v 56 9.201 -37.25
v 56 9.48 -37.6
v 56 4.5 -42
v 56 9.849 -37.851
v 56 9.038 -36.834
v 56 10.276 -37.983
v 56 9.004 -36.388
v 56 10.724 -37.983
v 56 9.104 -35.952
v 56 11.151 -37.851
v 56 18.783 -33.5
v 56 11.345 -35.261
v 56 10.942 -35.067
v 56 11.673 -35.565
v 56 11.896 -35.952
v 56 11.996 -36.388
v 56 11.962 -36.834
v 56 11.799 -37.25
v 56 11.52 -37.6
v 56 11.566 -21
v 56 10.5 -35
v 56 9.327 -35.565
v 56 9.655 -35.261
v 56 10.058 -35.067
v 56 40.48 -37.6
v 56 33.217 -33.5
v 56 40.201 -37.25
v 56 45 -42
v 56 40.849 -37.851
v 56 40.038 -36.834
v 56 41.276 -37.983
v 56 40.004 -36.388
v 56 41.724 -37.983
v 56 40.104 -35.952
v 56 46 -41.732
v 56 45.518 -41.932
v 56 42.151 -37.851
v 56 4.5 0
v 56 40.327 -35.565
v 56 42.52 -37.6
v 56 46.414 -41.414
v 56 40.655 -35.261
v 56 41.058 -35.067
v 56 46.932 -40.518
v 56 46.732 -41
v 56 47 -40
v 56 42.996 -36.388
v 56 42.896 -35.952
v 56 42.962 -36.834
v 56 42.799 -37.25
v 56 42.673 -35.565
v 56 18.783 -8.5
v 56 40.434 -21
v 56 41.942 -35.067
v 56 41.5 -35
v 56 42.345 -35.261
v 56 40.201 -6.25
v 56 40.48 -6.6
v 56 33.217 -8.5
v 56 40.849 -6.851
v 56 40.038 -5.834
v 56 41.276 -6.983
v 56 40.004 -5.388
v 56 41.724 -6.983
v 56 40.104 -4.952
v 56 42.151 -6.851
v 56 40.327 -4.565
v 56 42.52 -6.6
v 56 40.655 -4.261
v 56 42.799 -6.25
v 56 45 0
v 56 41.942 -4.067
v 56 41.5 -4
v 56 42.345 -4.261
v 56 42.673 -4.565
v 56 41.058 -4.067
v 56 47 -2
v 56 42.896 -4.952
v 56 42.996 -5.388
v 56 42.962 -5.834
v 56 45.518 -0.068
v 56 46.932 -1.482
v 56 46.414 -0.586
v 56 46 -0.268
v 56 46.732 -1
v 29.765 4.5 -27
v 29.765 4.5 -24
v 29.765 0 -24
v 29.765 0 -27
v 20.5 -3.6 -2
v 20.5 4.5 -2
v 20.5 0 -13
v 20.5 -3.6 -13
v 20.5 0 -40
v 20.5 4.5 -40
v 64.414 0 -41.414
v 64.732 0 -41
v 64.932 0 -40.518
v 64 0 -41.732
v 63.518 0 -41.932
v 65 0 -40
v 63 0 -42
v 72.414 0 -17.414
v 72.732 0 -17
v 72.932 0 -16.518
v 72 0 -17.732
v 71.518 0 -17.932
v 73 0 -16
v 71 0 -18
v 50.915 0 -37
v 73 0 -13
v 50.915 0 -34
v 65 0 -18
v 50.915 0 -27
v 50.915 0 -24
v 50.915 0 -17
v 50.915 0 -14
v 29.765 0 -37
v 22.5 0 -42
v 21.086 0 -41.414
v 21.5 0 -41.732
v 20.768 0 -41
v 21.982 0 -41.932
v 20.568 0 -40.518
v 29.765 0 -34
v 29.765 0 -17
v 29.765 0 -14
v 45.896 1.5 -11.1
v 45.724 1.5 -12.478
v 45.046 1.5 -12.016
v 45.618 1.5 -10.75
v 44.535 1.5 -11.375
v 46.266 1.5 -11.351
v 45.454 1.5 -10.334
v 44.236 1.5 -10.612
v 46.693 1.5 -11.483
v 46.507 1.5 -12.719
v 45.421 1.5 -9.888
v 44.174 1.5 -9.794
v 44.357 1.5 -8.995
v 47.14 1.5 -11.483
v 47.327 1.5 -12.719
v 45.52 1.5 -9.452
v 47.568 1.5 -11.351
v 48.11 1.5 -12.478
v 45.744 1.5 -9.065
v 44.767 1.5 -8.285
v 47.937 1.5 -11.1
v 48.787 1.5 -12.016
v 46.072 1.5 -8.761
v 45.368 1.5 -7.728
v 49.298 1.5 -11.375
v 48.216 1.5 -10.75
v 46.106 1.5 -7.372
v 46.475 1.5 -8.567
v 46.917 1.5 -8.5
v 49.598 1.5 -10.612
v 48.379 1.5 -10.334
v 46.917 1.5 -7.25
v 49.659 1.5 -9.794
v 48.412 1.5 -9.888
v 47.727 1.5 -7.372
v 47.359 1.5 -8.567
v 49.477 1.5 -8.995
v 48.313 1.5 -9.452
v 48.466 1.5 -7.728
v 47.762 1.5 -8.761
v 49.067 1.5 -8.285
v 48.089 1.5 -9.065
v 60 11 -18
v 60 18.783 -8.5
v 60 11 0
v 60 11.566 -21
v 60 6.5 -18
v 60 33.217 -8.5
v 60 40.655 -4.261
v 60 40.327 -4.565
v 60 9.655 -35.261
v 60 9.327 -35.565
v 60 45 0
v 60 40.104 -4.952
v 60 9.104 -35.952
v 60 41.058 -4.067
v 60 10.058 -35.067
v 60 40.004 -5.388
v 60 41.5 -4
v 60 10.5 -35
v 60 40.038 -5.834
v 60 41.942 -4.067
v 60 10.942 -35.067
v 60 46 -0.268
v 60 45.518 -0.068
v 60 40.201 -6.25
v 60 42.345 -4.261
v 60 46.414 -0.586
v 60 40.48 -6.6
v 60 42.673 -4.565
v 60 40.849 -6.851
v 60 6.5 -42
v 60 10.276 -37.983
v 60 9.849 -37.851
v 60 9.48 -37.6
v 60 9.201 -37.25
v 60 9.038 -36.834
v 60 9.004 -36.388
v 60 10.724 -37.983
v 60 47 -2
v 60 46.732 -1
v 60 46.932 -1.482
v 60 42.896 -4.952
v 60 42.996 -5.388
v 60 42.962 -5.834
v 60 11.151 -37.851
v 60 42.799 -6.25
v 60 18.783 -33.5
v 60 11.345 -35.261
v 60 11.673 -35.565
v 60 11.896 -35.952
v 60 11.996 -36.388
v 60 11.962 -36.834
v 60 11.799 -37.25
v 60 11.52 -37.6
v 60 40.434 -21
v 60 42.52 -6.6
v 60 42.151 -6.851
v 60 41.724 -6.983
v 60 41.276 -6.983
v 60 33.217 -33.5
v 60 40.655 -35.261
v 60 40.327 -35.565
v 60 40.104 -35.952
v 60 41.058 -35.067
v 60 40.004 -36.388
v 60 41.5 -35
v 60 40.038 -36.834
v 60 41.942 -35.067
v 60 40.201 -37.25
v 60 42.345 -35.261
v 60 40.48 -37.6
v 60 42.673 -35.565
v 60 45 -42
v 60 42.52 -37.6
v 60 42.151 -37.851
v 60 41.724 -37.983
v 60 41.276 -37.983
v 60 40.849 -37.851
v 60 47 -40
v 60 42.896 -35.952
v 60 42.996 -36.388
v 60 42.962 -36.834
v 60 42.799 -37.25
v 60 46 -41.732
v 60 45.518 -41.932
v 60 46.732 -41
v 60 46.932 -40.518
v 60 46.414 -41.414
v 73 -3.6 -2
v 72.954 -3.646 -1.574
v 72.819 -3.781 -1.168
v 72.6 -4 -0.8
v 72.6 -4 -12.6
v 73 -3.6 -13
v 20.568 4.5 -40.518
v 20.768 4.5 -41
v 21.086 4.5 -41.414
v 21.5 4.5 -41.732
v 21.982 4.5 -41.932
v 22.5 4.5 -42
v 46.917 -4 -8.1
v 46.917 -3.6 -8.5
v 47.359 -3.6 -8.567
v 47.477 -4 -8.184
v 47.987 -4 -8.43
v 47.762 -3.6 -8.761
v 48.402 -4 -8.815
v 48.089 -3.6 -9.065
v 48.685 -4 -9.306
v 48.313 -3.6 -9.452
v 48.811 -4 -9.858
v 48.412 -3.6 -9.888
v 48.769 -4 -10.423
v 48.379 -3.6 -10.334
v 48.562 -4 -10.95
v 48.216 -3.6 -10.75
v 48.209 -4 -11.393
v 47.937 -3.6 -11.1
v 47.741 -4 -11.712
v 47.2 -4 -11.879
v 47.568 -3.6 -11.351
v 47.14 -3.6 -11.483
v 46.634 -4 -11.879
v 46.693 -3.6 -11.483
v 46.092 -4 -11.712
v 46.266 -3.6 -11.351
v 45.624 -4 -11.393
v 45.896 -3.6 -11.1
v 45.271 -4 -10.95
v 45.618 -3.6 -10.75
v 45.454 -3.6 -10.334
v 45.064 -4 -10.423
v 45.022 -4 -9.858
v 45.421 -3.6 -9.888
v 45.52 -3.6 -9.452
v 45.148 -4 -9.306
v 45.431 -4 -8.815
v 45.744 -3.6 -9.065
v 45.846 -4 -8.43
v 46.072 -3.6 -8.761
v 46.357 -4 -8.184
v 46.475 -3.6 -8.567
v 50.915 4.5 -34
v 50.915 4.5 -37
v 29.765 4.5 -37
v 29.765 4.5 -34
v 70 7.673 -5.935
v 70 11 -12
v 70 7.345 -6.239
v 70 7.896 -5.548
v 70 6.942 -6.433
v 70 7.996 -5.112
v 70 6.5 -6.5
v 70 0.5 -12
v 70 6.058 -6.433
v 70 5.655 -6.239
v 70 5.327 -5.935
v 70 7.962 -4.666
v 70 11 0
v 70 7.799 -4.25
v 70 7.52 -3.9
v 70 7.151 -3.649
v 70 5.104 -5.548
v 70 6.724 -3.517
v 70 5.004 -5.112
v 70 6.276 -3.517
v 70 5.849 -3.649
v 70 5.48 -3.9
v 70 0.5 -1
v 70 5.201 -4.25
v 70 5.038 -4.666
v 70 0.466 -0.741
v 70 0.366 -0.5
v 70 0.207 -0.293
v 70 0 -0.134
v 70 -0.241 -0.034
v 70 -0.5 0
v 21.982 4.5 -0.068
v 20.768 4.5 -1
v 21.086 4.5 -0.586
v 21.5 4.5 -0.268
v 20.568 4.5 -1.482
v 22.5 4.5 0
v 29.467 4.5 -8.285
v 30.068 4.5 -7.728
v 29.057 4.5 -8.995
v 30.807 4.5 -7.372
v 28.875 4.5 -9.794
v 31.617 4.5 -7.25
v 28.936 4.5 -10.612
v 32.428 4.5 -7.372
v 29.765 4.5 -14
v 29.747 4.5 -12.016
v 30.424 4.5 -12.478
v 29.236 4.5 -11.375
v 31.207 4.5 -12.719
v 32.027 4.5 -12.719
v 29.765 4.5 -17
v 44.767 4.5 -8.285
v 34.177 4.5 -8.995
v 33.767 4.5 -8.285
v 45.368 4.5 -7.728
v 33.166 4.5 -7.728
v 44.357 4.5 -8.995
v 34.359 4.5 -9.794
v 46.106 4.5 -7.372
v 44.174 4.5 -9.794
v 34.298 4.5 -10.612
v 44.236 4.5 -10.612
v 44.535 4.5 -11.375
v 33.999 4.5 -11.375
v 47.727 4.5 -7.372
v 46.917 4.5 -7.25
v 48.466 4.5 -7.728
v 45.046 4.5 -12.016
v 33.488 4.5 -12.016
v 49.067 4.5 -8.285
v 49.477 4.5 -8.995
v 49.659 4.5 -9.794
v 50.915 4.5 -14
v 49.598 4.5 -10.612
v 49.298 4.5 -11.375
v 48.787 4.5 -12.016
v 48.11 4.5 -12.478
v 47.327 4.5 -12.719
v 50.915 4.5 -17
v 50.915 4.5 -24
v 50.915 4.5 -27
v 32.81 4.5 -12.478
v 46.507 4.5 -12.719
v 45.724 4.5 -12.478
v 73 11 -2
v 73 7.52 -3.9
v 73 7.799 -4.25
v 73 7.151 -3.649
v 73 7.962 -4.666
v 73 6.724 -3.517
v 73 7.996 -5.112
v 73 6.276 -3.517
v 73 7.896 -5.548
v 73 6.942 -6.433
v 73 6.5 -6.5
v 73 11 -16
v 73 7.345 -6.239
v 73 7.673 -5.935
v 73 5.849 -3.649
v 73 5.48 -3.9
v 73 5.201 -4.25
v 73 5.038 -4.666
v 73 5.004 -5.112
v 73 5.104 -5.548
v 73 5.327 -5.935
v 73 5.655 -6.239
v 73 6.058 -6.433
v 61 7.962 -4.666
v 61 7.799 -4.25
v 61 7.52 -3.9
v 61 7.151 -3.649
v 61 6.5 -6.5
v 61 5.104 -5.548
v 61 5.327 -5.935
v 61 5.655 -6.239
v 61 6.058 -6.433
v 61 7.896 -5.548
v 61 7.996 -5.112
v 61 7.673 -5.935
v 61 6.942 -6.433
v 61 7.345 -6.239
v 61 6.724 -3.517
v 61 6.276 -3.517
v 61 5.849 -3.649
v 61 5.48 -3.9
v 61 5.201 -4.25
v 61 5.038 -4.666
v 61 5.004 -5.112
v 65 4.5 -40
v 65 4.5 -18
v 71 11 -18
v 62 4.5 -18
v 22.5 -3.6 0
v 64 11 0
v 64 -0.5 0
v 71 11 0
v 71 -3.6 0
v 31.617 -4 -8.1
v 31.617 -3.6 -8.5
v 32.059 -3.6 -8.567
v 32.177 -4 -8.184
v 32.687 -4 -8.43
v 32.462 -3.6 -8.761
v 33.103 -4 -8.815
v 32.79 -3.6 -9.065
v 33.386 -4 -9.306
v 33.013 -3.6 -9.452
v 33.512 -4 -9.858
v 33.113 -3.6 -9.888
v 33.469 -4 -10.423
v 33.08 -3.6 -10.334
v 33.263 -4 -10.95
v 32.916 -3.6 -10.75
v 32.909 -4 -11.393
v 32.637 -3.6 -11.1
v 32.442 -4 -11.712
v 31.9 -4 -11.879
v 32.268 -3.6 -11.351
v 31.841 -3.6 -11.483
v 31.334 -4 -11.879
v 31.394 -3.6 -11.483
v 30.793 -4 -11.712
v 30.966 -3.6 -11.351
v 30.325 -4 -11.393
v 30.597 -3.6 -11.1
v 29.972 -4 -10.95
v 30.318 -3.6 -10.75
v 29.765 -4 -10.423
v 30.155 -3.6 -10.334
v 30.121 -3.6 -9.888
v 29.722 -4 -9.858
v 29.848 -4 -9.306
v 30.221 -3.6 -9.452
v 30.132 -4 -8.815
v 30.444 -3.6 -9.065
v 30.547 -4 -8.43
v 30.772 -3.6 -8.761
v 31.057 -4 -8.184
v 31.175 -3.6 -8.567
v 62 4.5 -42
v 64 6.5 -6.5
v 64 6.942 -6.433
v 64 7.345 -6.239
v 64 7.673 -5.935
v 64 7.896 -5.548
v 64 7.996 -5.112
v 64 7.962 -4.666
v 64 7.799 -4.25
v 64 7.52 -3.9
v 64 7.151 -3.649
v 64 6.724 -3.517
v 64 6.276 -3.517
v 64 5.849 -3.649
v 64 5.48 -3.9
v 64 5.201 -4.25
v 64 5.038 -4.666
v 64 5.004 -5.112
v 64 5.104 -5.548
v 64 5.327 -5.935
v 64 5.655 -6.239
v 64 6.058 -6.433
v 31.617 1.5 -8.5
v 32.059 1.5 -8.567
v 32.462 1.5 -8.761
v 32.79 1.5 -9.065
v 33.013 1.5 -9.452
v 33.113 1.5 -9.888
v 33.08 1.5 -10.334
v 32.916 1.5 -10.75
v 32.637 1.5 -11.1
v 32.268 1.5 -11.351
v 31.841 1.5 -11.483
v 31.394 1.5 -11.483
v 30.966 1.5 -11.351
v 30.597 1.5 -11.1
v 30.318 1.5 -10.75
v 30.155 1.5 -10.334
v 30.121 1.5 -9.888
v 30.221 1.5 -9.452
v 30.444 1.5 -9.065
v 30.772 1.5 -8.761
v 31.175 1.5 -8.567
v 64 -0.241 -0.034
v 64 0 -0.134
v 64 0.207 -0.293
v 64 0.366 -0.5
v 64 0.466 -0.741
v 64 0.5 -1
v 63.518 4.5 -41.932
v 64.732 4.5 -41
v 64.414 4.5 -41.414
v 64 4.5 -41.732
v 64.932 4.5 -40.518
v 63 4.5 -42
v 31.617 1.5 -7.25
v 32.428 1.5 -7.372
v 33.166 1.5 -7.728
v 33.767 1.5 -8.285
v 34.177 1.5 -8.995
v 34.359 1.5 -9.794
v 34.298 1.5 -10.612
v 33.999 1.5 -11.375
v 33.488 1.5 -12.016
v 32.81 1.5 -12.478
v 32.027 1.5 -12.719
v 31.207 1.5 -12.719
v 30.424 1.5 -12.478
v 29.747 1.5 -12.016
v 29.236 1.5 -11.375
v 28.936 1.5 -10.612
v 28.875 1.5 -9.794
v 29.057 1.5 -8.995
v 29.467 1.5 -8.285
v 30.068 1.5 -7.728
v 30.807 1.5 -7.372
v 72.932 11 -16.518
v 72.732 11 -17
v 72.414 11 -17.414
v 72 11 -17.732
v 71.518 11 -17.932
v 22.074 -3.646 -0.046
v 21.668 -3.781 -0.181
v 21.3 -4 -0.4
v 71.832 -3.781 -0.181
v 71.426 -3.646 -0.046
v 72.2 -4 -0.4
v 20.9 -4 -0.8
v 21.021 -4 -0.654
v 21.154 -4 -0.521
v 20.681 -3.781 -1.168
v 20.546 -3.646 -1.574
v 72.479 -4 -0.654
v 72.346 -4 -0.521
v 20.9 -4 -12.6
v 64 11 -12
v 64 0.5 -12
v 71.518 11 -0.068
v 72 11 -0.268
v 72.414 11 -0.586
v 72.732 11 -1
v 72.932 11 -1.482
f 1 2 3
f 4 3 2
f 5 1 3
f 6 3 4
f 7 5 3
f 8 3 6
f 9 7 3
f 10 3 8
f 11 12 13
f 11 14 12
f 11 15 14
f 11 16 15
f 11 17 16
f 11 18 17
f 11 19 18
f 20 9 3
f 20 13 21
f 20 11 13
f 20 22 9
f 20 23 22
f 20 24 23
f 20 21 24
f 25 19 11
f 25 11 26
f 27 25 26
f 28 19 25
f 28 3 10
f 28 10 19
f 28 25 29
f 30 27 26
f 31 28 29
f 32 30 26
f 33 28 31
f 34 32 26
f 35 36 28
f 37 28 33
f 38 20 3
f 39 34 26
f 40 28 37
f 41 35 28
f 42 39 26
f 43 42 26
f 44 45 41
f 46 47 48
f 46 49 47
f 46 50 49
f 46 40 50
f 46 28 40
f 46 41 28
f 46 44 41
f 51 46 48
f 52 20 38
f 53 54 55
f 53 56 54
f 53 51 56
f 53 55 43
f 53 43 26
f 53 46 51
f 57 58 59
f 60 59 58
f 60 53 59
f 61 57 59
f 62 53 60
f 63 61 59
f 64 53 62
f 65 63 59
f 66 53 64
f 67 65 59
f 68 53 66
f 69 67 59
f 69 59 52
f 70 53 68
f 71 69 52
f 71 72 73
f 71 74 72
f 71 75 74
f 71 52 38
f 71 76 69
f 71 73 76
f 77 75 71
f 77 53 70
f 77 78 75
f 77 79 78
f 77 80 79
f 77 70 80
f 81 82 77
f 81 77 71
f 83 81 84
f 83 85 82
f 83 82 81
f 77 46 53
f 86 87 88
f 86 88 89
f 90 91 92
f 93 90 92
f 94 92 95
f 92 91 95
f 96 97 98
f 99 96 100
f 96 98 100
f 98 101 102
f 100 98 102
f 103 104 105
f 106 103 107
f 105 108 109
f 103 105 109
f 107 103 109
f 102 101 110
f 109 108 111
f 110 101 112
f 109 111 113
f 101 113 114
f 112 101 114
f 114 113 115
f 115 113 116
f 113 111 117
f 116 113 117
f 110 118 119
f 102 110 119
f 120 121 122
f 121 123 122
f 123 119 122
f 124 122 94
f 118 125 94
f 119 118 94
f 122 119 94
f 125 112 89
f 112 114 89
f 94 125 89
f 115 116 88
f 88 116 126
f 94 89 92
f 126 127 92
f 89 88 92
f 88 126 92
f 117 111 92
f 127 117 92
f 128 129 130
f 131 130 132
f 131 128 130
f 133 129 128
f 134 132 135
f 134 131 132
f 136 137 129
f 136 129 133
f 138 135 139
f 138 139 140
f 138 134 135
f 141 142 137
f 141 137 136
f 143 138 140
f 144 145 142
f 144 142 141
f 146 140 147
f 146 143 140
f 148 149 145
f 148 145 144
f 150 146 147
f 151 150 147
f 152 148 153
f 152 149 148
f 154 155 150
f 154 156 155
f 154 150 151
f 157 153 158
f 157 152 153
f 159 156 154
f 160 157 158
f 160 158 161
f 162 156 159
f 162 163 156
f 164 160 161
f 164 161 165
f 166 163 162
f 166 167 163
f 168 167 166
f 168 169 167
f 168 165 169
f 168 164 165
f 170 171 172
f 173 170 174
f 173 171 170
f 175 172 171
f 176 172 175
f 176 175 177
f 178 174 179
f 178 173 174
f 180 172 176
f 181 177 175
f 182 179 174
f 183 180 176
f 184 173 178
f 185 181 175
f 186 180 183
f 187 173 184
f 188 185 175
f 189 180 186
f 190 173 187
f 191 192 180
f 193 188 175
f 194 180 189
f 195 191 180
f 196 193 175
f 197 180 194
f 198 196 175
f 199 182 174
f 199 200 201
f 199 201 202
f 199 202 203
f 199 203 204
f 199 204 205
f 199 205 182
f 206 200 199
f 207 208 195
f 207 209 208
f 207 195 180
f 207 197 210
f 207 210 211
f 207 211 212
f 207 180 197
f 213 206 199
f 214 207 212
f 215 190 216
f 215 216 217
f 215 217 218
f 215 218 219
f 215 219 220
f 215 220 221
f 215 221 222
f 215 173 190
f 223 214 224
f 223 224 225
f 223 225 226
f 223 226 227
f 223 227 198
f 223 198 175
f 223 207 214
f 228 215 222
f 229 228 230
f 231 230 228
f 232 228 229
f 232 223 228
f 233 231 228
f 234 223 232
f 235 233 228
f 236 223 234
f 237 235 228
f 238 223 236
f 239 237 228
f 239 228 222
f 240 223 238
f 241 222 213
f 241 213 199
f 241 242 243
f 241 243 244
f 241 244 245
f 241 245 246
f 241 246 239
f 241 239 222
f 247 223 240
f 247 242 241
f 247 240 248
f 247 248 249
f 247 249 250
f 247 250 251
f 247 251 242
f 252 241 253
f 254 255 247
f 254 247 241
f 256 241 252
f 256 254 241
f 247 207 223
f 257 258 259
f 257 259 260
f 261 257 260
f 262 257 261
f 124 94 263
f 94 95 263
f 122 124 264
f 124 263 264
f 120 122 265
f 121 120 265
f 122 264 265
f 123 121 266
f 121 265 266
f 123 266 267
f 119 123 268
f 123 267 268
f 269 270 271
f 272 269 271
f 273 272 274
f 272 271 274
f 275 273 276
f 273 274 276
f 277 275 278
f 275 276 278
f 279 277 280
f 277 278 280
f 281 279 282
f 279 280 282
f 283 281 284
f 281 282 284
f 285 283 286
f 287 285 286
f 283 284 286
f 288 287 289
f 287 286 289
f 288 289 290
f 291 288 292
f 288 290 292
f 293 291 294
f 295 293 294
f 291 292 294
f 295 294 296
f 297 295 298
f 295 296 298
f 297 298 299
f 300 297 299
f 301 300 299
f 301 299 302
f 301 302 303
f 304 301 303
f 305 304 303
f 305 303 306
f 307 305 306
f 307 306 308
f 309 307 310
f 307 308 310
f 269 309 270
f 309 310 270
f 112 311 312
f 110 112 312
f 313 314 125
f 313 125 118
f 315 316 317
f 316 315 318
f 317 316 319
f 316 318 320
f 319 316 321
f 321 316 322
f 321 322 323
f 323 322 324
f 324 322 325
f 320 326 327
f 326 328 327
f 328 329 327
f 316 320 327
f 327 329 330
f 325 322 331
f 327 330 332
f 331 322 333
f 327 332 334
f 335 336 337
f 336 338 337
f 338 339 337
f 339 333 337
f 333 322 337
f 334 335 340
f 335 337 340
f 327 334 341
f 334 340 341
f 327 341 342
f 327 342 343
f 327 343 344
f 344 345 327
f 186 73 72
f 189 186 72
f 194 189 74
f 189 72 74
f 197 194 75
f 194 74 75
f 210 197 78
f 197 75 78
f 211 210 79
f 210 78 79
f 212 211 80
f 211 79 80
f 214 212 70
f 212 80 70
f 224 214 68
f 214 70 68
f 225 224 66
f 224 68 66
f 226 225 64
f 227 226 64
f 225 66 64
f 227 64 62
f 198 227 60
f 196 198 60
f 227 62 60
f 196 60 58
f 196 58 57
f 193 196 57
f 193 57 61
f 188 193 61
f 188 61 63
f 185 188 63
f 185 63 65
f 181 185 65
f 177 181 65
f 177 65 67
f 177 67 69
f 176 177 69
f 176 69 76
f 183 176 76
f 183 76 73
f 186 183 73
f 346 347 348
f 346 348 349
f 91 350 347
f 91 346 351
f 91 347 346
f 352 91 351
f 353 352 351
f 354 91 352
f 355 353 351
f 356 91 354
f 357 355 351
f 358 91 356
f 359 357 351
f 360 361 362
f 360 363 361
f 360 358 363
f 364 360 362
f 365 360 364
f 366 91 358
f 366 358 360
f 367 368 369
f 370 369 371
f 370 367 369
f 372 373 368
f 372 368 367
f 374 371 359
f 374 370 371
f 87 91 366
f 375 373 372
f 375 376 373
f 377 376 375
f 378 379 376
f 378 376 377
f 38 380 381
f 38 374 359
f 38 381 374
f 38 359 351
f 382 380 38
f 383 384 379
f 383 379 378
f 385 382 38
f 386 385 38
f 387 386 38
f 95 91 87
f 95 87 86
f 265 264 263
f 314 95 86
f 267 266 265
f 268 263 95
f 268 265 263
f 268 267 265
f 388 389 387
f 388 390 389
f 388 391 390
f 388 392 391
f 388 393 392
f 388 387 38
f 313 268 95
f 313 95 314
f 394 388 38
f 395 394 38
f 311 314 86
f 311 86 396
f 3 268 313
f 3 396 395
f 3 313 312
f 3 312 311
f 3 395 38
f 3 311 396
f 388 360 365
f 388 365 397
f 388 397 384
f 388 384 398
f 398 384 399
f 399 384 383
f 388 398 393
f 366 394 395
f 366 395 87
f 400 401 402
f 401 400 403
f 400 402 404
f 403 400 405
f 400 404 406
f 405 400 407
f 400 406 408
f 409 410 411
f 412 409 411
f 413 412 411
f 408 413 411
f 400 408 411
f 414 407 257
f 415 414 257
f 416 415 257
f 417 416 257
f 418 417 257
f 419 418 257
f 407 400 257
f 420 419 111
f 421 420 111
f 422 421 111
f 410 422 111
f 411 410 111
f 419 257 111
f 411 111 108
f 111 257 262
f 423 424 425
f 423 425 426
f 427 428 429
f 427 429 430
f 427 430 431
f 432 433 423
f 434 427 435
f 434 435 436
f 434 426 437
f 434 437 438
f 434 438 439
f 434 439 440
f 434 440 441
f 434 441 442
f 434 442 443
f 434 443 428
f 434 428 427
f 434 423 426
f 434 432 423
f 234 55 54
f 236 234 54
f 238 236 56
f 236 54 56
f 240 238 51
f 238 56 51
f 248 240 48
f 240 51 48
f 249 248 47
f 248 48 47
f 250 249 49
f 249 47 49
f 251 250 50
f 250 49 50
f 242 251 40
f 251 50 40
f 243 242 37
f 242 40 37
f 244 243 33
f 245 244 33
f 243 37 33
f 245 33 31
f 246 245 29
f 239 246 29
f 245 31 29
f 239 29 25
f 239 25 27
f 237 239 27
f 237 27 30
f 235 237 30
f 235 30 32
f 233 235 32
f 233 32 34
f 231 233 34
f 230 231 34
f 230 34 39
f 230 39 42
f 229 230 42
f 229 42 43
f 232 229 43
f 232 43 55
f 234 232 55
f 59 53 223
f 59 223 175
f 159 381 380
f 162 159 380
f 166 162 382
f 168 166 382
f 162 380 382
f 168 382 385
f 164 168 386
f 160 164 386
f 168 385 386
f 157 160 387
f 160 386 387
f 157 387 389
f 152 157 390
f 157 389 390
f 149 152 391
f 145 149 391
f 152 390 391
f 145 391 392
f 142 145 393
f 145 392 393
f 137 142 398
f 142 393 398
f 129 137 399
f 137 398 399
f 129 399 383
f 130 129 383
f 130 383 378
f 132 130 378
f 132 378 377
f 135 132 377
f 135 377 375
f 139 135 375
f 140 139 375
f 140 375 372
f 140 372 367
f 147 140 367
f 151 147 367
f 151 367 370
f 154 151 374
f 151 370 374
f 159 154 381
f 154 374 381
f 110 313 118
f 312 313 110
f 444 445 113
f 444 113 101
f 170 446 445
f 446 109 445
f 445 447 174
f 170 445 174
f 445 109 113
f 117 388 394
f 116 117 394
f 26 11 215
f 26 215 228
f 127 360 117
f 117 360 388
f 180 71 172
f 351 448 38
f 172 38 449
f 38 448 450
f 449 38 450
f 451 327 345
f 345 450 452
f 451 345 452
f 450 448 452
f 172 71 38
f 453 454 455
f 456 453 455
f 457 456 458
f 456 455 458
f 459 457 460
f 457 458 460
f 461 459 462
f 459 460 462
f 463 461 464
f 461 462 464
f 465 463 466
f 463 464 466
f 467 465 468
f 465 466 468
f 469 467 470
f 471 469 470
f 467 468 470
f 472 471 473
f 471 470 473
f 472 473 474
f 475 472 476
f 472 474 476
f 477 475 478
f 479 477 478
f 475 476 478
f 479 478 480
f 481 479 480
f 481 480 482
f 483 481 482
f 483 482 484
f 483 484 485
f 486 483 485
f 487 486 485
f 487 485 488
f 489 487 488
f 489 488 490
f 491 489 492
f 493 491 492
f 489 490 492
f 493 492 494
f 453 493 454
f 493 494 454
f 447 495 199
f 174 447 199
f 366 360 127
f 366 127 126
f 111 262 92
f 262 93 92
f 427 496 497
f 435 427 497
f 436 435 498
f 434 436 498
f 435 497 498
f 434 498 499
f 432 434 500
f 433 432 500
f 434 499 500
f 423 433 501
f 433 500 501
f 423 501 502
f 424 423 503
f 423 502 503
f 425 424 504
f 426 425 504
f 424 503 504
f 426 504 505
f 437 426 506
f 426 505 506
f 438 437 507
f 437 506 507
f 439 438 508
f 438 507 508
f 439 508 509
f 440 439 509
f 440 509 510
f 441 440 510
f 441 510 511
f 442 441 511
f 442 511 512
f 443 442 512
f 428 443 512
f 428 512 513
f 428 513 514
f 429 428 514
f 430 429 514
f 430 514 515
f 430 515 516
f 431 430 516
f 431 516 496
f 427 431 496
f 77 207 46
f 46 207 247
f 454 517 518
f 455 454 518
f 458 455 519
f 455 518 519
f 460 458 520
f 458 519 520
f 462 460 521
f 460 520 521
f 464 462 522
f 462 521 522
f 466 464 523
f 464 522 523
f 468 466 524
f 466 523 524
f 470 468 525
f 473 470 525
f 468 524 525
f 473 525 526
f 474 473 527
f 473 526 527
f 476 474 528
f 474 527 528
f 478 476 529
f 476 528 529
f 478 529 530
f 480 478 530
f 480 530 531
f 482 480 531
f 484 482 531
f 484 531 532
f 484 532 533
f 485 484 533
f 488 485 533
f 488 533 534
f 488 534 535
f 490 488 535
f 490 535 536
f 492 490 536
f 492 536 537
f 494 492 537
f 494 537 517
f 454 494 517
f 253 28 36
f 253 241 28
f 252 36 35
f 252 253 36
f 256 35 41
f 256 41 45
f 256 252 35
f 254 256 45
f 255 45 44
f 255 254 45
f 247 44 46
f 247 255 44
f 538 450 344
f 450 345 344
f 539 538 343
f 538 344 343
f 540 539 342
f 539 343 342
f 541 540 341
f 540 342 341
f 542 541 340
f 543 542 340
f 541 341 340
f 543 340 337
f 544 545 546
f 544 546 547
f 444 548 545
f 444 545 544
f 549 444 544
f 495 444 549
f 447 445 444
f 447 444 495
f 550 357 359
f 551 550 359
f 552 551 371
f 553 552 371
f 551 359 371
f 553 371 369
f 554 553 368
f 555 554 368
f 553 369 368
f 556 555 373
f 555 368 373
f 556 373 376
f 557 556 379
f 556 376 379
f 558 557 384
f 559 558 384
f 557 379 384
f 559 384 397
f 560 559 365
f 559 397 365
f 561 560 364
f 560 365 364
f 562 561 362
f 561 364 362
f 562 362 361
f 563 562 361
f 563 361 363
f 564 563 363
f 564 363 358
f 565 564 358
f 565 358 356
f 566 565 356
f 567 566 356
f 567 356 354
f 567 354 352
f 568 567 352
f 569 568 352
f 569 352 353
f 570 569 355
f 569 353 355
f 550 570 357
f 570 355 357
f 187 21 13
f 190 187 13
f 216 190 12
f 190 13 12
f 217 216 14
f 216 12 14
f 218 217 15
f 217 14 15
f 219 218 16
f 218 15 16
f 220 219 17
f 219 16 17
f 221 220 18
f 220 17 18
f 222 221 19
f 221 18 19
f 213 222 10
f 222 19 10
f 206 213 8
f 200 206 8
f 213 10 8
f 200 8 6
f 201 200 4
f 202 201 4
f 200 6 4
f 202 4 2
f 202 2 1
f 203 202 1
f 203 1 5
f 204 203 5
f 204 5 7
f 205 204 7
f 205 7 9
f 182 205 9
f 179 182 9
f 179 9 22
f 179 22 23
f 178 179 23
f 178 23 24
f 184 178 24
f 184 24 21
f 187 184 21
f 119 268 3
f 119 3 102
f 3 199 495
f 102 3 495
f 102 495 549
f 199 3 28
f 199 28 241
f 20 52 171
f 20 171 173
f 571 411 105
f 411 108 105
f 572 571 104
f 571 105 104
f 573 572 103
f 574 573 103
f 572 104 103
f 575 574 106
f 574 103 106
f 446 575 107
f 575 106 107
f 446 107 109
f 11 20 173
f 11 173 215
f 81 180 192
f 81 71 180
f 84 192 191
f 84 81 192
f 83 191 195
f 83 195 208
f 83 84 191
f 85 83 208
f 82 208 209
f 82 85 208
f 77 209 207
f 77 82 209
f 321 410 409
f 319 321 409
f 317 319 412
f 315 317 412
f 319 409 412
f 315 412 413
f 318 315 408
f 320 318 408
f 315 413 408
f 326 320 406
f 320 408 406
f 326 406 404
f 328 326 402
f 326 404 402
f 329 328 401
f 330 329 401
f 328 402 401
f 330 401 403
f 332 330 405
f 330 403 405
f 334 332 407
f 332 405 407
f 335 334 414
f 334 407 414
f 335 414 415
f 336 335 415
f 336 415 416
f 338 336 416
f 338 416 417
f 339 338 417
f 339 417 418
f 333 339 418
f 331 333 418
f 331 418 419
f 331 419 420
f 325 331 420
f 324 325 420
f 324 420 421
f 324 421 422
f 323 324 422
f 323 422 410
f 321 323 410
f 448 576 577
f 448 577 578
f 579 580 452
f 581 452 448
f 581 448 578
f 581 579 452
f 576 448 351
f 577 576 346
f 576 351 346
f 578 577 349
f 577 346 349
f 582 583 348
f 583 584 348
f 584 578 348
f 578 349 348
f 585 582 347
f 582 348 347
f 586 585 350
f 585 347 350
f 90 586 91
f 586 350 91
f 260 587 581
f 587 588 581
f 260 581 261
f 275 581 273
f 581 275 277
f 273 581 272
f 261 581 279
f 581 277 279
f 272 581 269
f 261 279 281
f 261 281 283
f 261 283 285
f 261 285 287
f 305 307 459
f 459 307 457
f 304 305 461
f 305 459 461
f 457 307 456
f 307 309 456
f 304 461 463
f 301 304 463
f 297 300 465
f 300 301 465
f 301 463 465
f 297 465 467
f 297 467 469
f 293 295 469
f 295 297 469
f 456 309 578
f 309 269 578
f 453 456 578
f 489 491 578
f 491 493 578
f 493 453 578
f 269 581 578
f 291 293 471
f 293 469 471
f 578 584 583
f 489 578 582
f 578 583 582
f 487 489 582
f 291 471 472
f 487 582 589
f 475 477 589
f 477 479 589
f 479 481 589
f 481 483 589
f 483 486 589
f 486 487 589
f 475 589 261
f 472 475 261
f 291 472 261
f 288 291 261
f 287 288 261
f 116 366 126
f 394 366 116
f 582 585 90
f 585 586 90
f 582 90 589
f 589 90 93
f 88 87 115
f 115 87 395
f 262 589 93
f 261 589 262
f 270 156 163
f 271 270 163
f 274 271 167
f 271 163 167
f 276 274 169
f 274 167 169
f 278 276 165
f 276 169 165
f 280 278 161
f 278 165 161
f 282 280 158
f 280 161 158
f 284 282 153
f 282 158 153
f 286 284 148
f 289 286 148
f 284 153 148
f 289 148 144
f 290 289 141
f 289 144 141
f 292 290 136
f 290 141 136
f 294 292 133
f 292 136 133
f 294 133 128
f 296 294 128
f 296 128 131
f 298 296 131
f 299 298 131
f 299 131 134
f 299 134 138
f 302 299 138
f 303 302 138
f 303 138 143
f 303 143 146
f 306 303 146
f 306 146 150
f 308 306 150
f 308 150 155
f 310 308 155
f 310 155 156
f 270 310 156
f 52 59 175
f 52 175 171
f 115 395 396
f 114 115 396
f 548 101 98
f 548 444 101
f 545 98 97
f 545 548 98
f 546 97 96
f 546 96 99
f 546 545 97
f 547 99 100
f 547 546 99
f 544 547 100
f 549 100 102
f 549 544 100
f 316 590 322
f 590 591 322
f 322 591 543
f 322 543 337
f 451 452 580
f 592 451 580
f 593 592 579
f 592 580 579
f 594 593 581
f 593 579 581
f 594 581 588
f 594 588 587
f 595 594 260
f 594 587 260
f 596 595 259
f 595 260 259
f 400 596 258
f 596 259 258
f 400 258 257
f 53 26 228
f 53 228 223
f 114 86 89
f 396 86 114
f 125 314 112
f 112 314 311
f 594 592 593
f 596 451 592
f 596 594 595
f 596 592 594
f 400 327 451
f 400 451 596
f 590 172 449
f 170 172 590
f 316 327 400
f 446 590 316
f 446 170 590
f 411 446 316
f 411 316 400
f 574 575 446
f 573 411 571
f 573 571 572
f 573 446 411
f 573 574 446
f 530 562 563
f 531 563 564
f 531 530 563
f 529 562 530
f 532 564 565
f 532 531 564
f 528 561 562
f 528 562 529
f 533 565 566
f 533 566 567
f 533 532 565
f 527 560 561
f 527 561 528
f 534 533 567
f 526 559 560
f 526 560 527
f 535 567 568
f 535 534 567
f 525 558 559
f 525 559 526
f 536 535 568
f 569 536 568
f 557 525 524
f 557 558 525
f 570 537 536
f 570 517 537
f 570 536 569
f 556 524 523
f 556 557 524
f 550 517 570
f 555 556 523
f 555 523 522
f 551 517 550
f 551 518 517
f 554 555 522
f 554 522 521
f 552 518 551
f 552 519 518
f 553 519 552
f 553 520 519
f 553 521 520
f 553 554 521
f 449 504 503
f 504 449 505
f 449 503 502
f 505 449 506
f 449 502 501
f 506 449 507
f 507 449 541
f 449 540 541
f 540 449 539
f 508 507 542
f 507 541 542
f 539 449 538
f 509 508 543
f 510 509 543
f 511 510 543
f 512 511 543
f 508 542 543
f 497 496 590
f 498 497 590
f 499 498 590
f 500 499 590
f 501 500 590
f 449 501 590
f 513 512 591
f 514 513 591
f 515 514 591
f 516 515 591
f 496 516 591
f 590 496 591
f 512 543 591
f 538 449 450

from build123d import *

# Parameters (mm, degrees)
EXTRUDE_1_DEPTH           = 5
SKETCH_3_W                = 4
SKETCH_3_H                = 42
EXTRUDE_2_DEPTH           = 42
SKETCH_4_R                = 1.5
CUT_EXTRUDE_1_DEPTH       = 42.5
SKETCH_5_R                = 12.5
CUT_EXTRUDE_2_DEPTH       = 42.5
SKETCH_7_W                = 20
SKETCH_7_H                = 5
EXTRUDE_3_DEPTH           = 5
EXTRUDE_5_DEPTH           = 42
SKETCH_11_W               = 20
SKETCH_11_H               = 5
EXTRUDE_6_DEPTH           = 18
SKETCH_12_W               = 4
SKETCH_12_H               = 20
EXTRUDE_7_DEPTH           = 42
CUT_EXTRUDE_4_REACH       = 106.221
SKETCH_13_R               = 1.6
CUT_EXTRUDE_START         = -22
SKETCH_15_W               = 10
SKETCH_15_H               = 27
CUT_EXTRUDE_5_DEPTH       = 22
SKETCH_16_W               = 5
SKETCH_16_H               = 5
CUT_EXTRUDE_6_DEPTH       = 42
EXTRUDE_START             = -22
SKETCH_17_W               = 10
SKETCH_17_H               = 5
EXTRUDE_8_DEPTH           = 22
CUT_EXTRUDE_7_DEPTH       = 5
CHAMFER_1_SIZE            = 7
EXTRUDE_10_REACH          = 103.064
SKETCH_28_W               = 5
SKETCH_28_H               = 10
SKETCH_29_W               = 10
SKETCH_29_H               = 13
SKETCH_29_W_2             = 33
EXTRUDE_11_DEPTH          = 3
EXTRUDE_12_DEPTH          = 10
EXTRUDE_13_DEPTH          = 10
CUT_EXTRUDE_8_DEPTH       = 10
EXTRUDE_14_REACH          = 91.118
SKETCH_34_R               = 3
CUT_EXTRUDE_9_DEPTH       = 3
SKETCH_35_R               = 1.5
CUT_EXTRUDE_10_DEPTH      = 104.334408597
SKETCH_37_W               = 25
SKETCH_37_H               = 3.734653936
CUT_EXTRUDE_11_DEPTH      = 103.063705596
EXTRUDE_15_DEPTH          = 5
CUT_EXTRUDE_12_DEPTH      = 5
SKETCH_40_W               = 19
SKETCH_40_H               = 5
CUT_EXTRUDE_13_DEPTH      = 42
SKETCH_41_W               = 19
SKETCH_41_H               = 5
CUT_EXTRUDE_14_DEPTH      = 42
EXTRUDE_16_DEPTH          = 5
EXTRUDE_17_DEPTH          = 5
SKETCH_44_R               = 1.6
CUT_EXTRUDE_15_DEPTH      = 97.446876569
CUT_EXTRUDE_16_DEPTH      = 20
EXTRUDE_18_REACH          = 88.155
SKETCH_46_W               = 25
SKETCH_46_H               = 5
SKETCH_48_W               = 46
SKETCH_48_H               = 42
CUT_EXTRUDE_17_DEPTH      = 0.5
SKETCH_49_W               = 42
SKETCH_49_H               = 4.5
CUT_EXTRUDE_18_DEPTH      = 10.5
SKETCH_50_W               = 42
SKETCH_50_H               = 4.5
EXTRUDE_19_DEPTH          = 49.5
SKETCH_52_W               = 21.14986069
SKETCH_52_H               = 3
CUT_EXTRUDE_19_DEPTH      = 93.033961123
SKETCH_53_W               = 49.5
SKETCH_53_H               = 13
EXTRUDE_21_DEPTH          = 4
CUT_EXTRUDE_20_DEPTH      = 5
SKETCH_55_R               = 2.75
CUT_EXTRUDE_21_DEPTH      = 3
SKETCH_56_R               = 1.5
CUT_EXTRUDE_22_DEPTH      = 90.77332566
SKETCH_57_W               = 13
SKETCH_57_H               = 8.5
EXTRUDE_22_DEPTH          = 5
SKETCH_61_W               = 13
SKETCH_61_H               = 8.5
EXTRUDE_25_DEPTH          = 3
SKETCH_64_W               = 8
SKETCH_64_H               = 4.5
EXTRUDE_26_DEPTH          = 5
EXTRUDE_27_DEPTH          = 5
CUT_EXTRUDE_23_DEPTH      = 95.335836245
CUT_EXTRUDE_23_DEPTH_BACK = 4
SKETCH_62_W               = 6
SKETCH_62_H               = 12
FILLET_2_R                = 1
SKETCH_63_R               = 1.5
CUT_EXTRUDE_24_DEPTH      = 12
SKETCH_66_R               = 1.5
EXTRUDE_28_DEPTH          = 4
CHAMFER_2_SIZE            = 0.4
FILLET_3_R                = 2
EXTRUDE_29_DEPTH          = 24
FILLET_4_R                = 2
CUT_EXTRUDE_START_2       = -4.000001
CUT_EXTRUDE_25_DEPTH      = 4.000002
EXTRUDE_30_DEPTH          = 1.5


# Some blends are built 0.0001 mm under size
with BuildPart() as part:
    # 草图1 → 凸台-拉伸1 (new body)
    with BuildSketch(Plane(origin=(0, 0, 0), x_dir=(1, 0, 0), z_dir=(0, 1, 0))):
        Polygon((10, 0), (50, 0), (50, -20), (60, -20), (60, 0), (60, 42), (0, 42), (0, 0), (0, -20), (10, -20), align=None)
    extrude(amount=EXTRUDE_1_DEPTH)

    # 草图3 → 凸台-拉伸2 (add)
    with BuildSketch(Plane(origin=(0, 5, 0), x_dir=(1, 0, 0), z_dir=(0, 1, 0))):
        with Locations((58, 21)):
            Rectangle(SKETCH_3_W, SKETCH_3_H)
    extrude(amount=EXTRUDE_2_DEPTH)

    # 草图4 → 切除-拉伸1 (cut)
    with BuildSketch(Plane.ZY.offset(-56)):
        with Locations((-36.5, 41.5)):
            Circle(SKETCH_4_R)
        with Locations((-5.5, 41.5)):
            Circle(SKETCH_4_R)
        with Locations((-5.5, 10.5)):
            Circle(SKETCH_4_R)
        with Locations((-36.5, 10.5)):
            Circle(SKETCH_4_R)
    extrude(amount=-CUT_EXTRUDE_1_DEPTH, mode=Mode.SUBTRACT)

    # 草图5 → 切除-拉伸2 (cut)
    with BuildSketch(Plane.ZY.offset(-56)):
        with Locations((-21, 26)):
            Circle(SKETCH_5_R)
    extrude(amount=-CUT_EXTRUDE_2_DEPTH, mode=Mode.SUBTRACT)

    # 草图7 → 凸台-拉伸3 (add)
    with BuildSketch(Plane(origin=(60, 0, 0), x_dir=(0, 0, -1), z_dir=(1, 0, 0))):
        with Locations((-10, 2.5)):
            Rectangle(SKETCH_7_W, SKETCH_7_H)
    extrude(amount=EXTRUDE_3_DEPTH)

    # 草图8 → 凸台-拉伸5 (add)
    with BuildSketch(Plane(origin=(0, 5, 0), x_dir=(1, 0, 0), z_dir=(0, 1, 0))):
        Polygon((65, 0), (56, 0), (56, -5), (61, -5), (61, -15), (56, -15), (56, -20), (65, -20), align=None)
    extrude(amount=EXTRUDE_5_DEPTH)

    # 草图11 → 凸台-拉伸6 (add)
    with BuildSketch(Plane(origin=(65, 0, 0), x_dir=(0, 0, -1), z_dir=(1, 0, 0))):
        with Locations((-10, 2.5)):
            Rectangle(SKETCH_11_W, SKETCH_11_H)
    extrude(amount=EXTRUDE_6_DEPTH)

    # 草图12 → 凸台-拉伸7 (add)
    with BuildSketch(Plane(origin=(0, 5, 0), x_dir=(1, 0, 0), z_dir=(0, 1, 0))):
        with Locations((81, -10)):
            Rectangle(SKETCH_12_W, SKETCH_12_H)
    extrude(amount=EXTRUDE_7_DEPTH)

    # 切除-拉伸4: up to this face of the body (flat: up to its plane)
    cut_extrude_4_end = Plane(part.part.faces().sort_by_distance((61, 26, 10))[0])
    # 草图13 → 切除-拉伸4 (cut, up to the picked face)
    with BuildSketch(Plane(origin=(83, 0, 0), x_dir=(0, 0, -1), z_dir=(1, 0, 0)), mode=Mode.PRIVATE) as cut_extrude_4_sk1:
        with Locations((-10, 37)):
            Circle(SKETCH_13_R)
    cut_extrude_4_tool1 = split(extrude(cut_extrude_4_sk1.sketch, amount=-CUT_EXTRUDE_4_REACH, mode=Mode.PRIVATE), bisect_by=cut_extrude_4_end, keep=Keep.BOTH, mode=Mode.PRIVATE)
    add(cut_extrude_4_tool1.solids().sort_by(Axis((83, 37, 10), (-1, 0, 0)))[0], mode=Mode.SUBTRACT)

    # 草图15 → 切除-拉伸5 (cut)
    with BuildSketch(Plane.ZY.offset(-61).offset(CUT_EXTRUDE_START)):
        with Locations((10, 18.5)):
            Rectangle(SKETCH_15_W, SKETCH_15_H)
    extrude(amount=CUT_EXTRUDE_5_DEPTH, mode=Mode.SUBTRACT)

    # 草图16 → 切除-拉伸6 (cut)
    with BuildSketch(Plane(origin=(0, 47, 0), x_dir=(1, 0, 0), z_dir=(0, 1, 0))):
        with Locations((58.5, -17.5)):
            Rectangle(SKETCH_16_W, SKETCH_16_H)
    extrude(amount=-CUT_EXTRUDE_6_DEPTH, mode=Mode.SUBTRACT)

    # 草图17 → 凸台-拉伸8 (add)
    with BuildSketch(Plane.ZY.offset(-61).offset(EXTRUDE_START)):
        with Locations((10, 7.5)):
            Rectangle(SKETCH_17_W, SKETCH_17_H)
    extrude(amount=EXTRUDE_8_DEPTH)

    # 草图19 → 切除-拉伸7 (cut)
    with BuildSketch(Plane(origin=(0, 10, 0), x_dir=(1, 0, 0), z_dir=(0, 1, 0))):
        Polygon((79, -15), (83, -15), (83, -5), (79, -5), (65, -5), (61, -5), (61, -15), (65, -15), align=None)
    extrude(amount=-CUT_EXTRUDE_7_DEPTH, mode=Mode.SUBTRACT)

    # 倒角1
    chamfer_1_edges = [part.edges().sort_by_distance(p)[0] for p in [
        (79, 5, 2.5),
        (65, 5, 2.5),
    ]]
    chamfer(chamfer_1_edges, length=CHAMFER_1_SIZE - 0.0001)  # a hair under: the kernel refuses the full size

    # 草图28 → 凸台-拉伸10 (add, up to next)
    with BuildSketch(Plane.ZY.offset(-79), mode=Mode.PRIVATE) as extrude_10_sk1:
        with Locations((17.5, 19)):
            Rectangle(SKETCH_28_W, SKETCH_28_H)
    extrude_10_tool1 = extrude(extrude_10_sk1.sketch, amount=EXTRUDE_10_REACH, mode=Mode.PRIVATE) - part.part
    add(extrude_10_tool1.solids().sort_by_distance((79, 19, 17.5))[0])

    # 草图29 → 凸台-拉伸11 (add)
    with BuildSketch(Plane(origin=(0, 0, 0), x_dir=(-1, 0, 0), z_dir=(0, -1, 0))):
        with Locations((-5, -13.5)):
            Rectangle(SKETCH_29_W, SKETCH_29_H)
        with Locations((-66.5, -13.5)):
            Rectangle(SKETCH_29_W_2, SKETCH_29_H)
    extrude(amount=EXTRUDE_11_DEPTH)

    # 草图30 → 凸台-拉伸12 (add)
    with BuildSketch(Plane(origin=(10, 0, 0), x_dir=(0, 0, -1), z_dir=(1, 0, 0))):
        Polygon((-20, 5), (-20, -3), (-7, -3), (-7, 0), (0, 0), (0, 5), align=None)
    extrude(amount=EXTRUDE_12_DEPTH)

    # 草图31 → 凸台-拉伸13 (add)
    with BuildSketch(Plane.ZY.offset(-50)):
        Polygon((0, 0), (7, 0), (7, -3), (20, -3), (20, 5), (0, 5), align=None)
    extrude(amount=EXTRUDE_13_DEPTH)

    # 草图32 → 切除-拉伸8 (cut)
    with BuildSketch(Plane.ZY):
        Polygon((-42, 0), (7, 0), (7, -3), (20, -3), (20, 5), (-42, 5), align=None)
    extrude(amount=-CUT_EXTRUDE_8_DEPTH, mode=Mode.SUBTRACT)

    # 草图33 → 凸台-拉伸14 (add, up to next)
    with BuildSketch(Plane(origin=(20, 0, 0), x_dir=(0, 0, -1), z_dir=(1, 0, 0)), mode=Mode.PRIVATE) as extrude_14_sk1:
        Polygon((0, 5), (-20, 5), (-20, -3), (-7, -3), (-7, 0), (0, 0), align=None)
    extrude_14_tool1 = extrude(extrude_14_sk1.sketch, amount=EXTRUDE_14_REACH, mode=Mode.PRIVATE) - part.part
    add(extrude_14_tool1.solids().sort_by_distance((20, 1.377698, 10.982014))[0])

    # 草图34 → 切除-拉伸9 (cut)
    with BuildSketch(Plane(origin=(0, 5, 0), x_dir=(1, 0, 0), z_dir=(0, 1, 0))):
        with Locations(Location((19.284781786, -10, 0), (0, 0, 270))):
            Circle(SKETCH_34_R)
        with Locations(Location((51.101803391, -10, 0), (0, 0, 270))):
            Circle(SKETCH_34_R)
    extrude(amount=-CUT_EXTRUDE_9_DEPTH, mode=Mode.SUBTRACT)

    # 草图35 → 切除-拉伸10 (cut, through all)
    with BuildSketch(Plane(origin=(0, 2, 0), x_dir=(1, 0, 0), z_dir=(0, 1, 0))):
        with Locations(Location((19.284781786, -10, 0), (0, 0, 270))):
            Circle(SKETCH_35_R)
        with Locations(Location((51.101803391, -10, 0), (0, 0, 270))):
            Circle(SKETCH_35_R)
    extrude(amount=-CUT_EXTRUDE_10_DEPTH, mode=Mode.SUBTRACT)

    # 草图37 → 切除-拉伸11 (cut, through all)
    with BuildSketch(Plane(origin=(0, 5, 0), x_dir=(1, 0, 0), z_dir=(0, 1, 0))):
        with Locations((35.5, 33.696781352)):
            Rectangle(SKETCH_37_W, SKETCH_37_H)
        with Locations((35.5, 23.696781352)):
            Rectangle(SKETCH_37_W, SKETCH_37_H)
        with Locations((35.5, 13.696781352)):
            Rectangle(SKETCH_37_W, SKETCH_37_H)
        with Locations((35.5, 3.696781352)):
            Rectangle(SKETCH_37_W, SKETCH_37_H)
    extrude(amount=-CUT_EXTRUDE_11_DEPTH, mode=Mode.SUBTRACT)

    # 草图38 → 凸台-拉伸15 (add)
    with BuildSketch(Plane.ZY.offset(-61)):
        Polygon((15, 32), (15, 5), (20, 5), (20, 47), (5, 47), (5, 32), align=None)
    extrude(amount=EXTRUDE_15_DEPTH)

    # 草图39 → 切除-拉伸12 (cut)
    with BuildSketch(Plane(origin=(65, 0, 0), x_dir=(0, 0, -1), z_dir=(1, 0, 0))):
        Polygon((-20, 47), (-20, 24), (-15, 24), (-15, 32), (-5, 32), (-5, 12), (0, 12), (0, 47), align=None)
    extrude(amount=-CUT_EXTRUDE_12_DEPTH, mode=Mode.SUBTRACT)

    # 草图40 → 切除-拉伸13 (cut)
    with BuildSketch(Plane(origin=(0, 47, 0), x_dir=(1, 0, 0), z_dir=(0, 1, 0))):
        with Locations((69.5, -2.5)):
            Rectangle(SKETCH_40_W, SKETCH_40_H)
    extrude(amount=-CUT_EXTRUDE_13_DEPTH, mode=Mode.SUBTRACT)

    # 草图41 → 切除-拉伸14 (cut)
    with BuildSketch(Plane(origin=(0, 47, 0), x_dir=(1, 0, 0), z_dir=(0, 1, 0))):
        with Locations((69.5, -17.5)):
            Rectangle(SKETCH_41_W, SKETCH_41_H)
    extrude(amount=-CUT_EXTRUDE_14_DEPTH, mode=Mode.SUBTRACT)

    # 草图42 → 凸台-拉伸16 (add)
    with BuildSketch(Plane.XY.offset(20)):
        Polygon((60, 20), (60, 5), (69.5, 12.5), align=None)
        Polygon((60, 5), (69.5, 5), (79, 5), (69.5, 12.5), align=None)
        Polygon((69.5, 12.5), (79, 5), (79, 20), align=None)
    extrude(amount=-EXTRUDE_16_DEPTH)

    # 草图43 → 凸台-拉伸17 (add)
    with BuildSketch(Plane(origin=(0, 0, 0), x_dir=(-1, 0, 0), z_dir=(0, 0, -1))):
        Polygon((-69.5, 12.5), (-60, 5), (-60, 20), align=None)
        Polygon((-69.5, 12.5), (-79, 5), (-60, 5), align=None)
        Polygon((-79, 20), (-79, 5), (-69.5, 12.5), align=None)
    extrude(amount=-EXTRUDE_17_DEPTH)

    # 草图44 → 切除-拉伸15 (cut, through all)
    with BuildSketch(Plane(origin=(83, 0, 0), x_dir=(0, 0, -1), z_dir=(1, 0, 0))):
        with Locations((-10, 37)):
            Circle(SKETCH_44_R)
    extrude(amount=-CUT_EXTRUDE_15_DEPTH, mode=Mode.SUBTRACT)

    # 草图45 → 切除-拉伸16 (cut)
    with BuildSketch(Plane.XY.offset(20)):
        Polygon((69.5, 12.5), (60, 20), (60, 47), (56, 47), (56, 5), (10, 5), (10, -3), (83, -3), (83, 47), (79, 47), (79, 20), align=None)
    extrude(amount=-CUT_EXTRUDE_16_DEPTH, mode=Mode.SUBTRACT)

    # 草图46 → 凸台-拉伸18 (add, up to next)
    with BuildSketch(Plane(origin=(0, 0, -1.829454384), x_dir=(-1, 0, 0), z_dir=(0, 0, -1)), mode=Mode.PRIVATE) as extrude_18_sk1:
        with Locations((-35.5, 2.5)):
            Rectangle(SKETCH_46_W, SKETCH_46_H)
    extrude_18_tool1 = extrude(extrude_18_sk1.sketch, amount=EXTRUDE_18_REACH, mode=Mode.PRIVATE) - part.part
    add(extrude_18_tool1.solids().sort_by_distance((35.5, 2.5, -1.829454))[0])

    # 草图48 → 切除-拉伸17 (cut)
    with BuildSketch(Plane(origin=(0, 5, 0), x_dir=(1, 0, 0), z_dir=(0, 1, 0))):
        with Locations((33, 21)):
            Rectangle(SKETCH_48_W, SKETCH_48_H)
    extrude(amount=-CUT_EXTRUDE_17_DEPTH, mode=Mode.SUBTRACT)

    # 草图49 → 切除-拉伸18 (cut)
    with BuildSketch(Plane.ZY.offset(-10)):
        with Locations((-21, 2.25)):
            Rectangle(SKETCH_49_W, SKETCH_49_H)
    extrude(amount=-CUT_EXTRUDE_18_DEPTH, mode=Mode.SUBTRACT)

    # 草图50 → 凸台-拉伸19 (add)
    with BuildSketch(Plane.ZY.offset(-20.5)):
        with Locations((-21, 2.25)):
            Rectangle(SKETCH_50_W, SKETCH_50_H)
    extrude(amount=-EXTRUDE_19_DEPTH)

    # 草图52 → 切除-拉伸19 (cut, through all)
    with BuildSketch(Plane(origin=(0, 4.5, 0), x_dir=(1, 0, 0), z_dir=(0, 1, 0))):
        with Locations((40.340210911, 25.5)):
            Rectangle(SKETCH_52_W, SKETCH_52_H)
        with Locations((40.340210911, 35.5)):
            Rectangle(SKETCH_52_W, SKETCH_52_H)
        with Locations((40.340210911, 15.5)):
            Rectangle(SKETCH_52_W, SKETCH_52_H)
    extrude(amount=-CUT_EXTRUDE_19_DEPTH, mode=Mode.SUBTRACT)

    # 草图53 → 凸台-拉伸21 (add)
    with BuildSketch(Plane(origin=(0, 0, 0), x_dir=(-1, 0, 0), z_dir=(0, -1, 0))):
        with Locations((-45.25, 6.5)):
            Rectangle(SKETCH_53_W, SKETCH_53_H)
    extrude(amount=EXTRUDE_21_DEPTH)

    # 草图54 → 切除-拉伸20 (cut)
    with BuildSketch(Plane(origin=(70, 0, 0), x_dir=(0, 0, -1), z_dir=(1, 0, 0))):
        Polygon((42, 0), (42, 4.5), (0, 4.5), (0, -4), (13, -4), (13, 0), align=None)
    extrude(amount=-CUT_EXTRUDE_20_DEPTH, mode=Mode.SUBTRACT)

    # 草图55 → 切除-拉伸21 (cut)
    with BuildSketch(Plane(origin=(0, 4.5, 0), x_dir=(1, 0, 0), z_dir=(0, 1, 0))):
        with Locations(Location((31.617123072, 10, 0), (0, 0, 270))):
            Circle(SKETCH_55_R)
        with Locations(Location((46.91669078, 10, 0), (0, 0, 270))):
            Circle(SKETCH_55_R)
    extrude(amount=-CUT_EXTRUDE_21_DEPTH, mode=Mode.SUBTRACT)

    # 草图56 → 切除-拉伸22 (cut, through all)
    with BuildSketch(Plane(origin=(0, 1.5, 0), x_dir=(1, 0, 0), z_dir=(0, 1, 0))):
        with Locations(Location((31.617123072, 10, 0), (0, 0, 270))):
            Circle(SKETCH_56_R)
        with Locations(Location((46.91669078, 10, 0), (0, 0, 270))):
            Circle(SKETCH_56_R)
    extrude(amount=-CUT_EXTRUDE_22_DEPTH, mode=Mode.SUBTRACT)

    # 草图57 → 凸台-拉伸22 (add)
    with BuildSketch(Plane(origin=(65, 0, 0), x_dir=(0, 0, -1), z_dir=(1, 0, 0))):
        with Locations((6.5, 0.25)):
            Rectangle(SKETCH_57_W, SKETCH_57_H)
    extrude(amount=EXTRUDE_22_DEPTH)

    # 草图61 → 凸台-拉伸25 (add)
    with BuildSketch(Plane(origin=(70, 0, 0), x_dir=(0, 0, -1), z_dir=(1, 0, 0))):
        with Locations((6.5, 0.25)):
            Rectangle(SKETCH_61_W, SKETCH_61_H)
    extrude(amount=EXTRUDE_25_DEPTH)

    # 草图64 → 凸台-拉伸26 (add)
    with BuildSketch(Plane(origin=(0, 0, -13), x_dir=(-1, 0, 0), z_dir=(0, 0, -1))):
        with Locations((-69, 2.25)):
            Rectangle(SKETCH_64_W, SKETCH_64_H)
    extrude(amount=EXTRUDE_26_DEPTH)

    # 草图65 → 凸台-拉伸27 (add)
    with BuildSketch(Plane(origin=(0, 4.5, 0), x_dir=(1, 0, 0), z_dir=(0, 1, 0))):
        Polygon((73, 18), (65, 18), (60, 18), (60, 0), (73, 0), align=None)
    extrude(amount=EXTRUDE_27_DEPTH)

    # 草图62 → 切除-拉伸23 (cut, two sides: drawn at the far end of the back side and taken through both)
    with BuildSketch(Plane(origin=(0, 4.5, 0), x_dir=(1, 0, 0), z_dir=(0, 1, 0)).offset(-CUT_EXTRUDE_23_DEPTH_BACK)):
        with Locations((67, 6)):
            Rectangle(SKETCH_62_W, SKETCH_62_H)
    extrude(amount=CUT_EXTRUDE_23_DEPTH + CUT_EXTRUDE_23_DEPTH_BACK, mode=Mode.SUBTRACT)

    # 圆角2
    fillet_2_edges = [part.edges().sort_by_distance(p)[0] for p in [
        (67, 0.5, 0),
    ]]
    fillet(fillet_2_edges, radius=FILLET_2_R)

    # 草图63 → 切除-拉伸24 (cut)
    with BuildSketch(Plane(origin=(73, 0, 0), x_dir=(0, 0, -1), z_dir=(1, 0, 0))):
        with Locations((5, 6.5)):
            Circle(SKETCH_63_R)
    extrude(amount=-CUT_EXTRUDE_24_DEPTH, mode=Mode.SUBTRACT)

    # 草图66 → 凸台-拉伸28 (add)
    with BuildSketch(Plane.ZY.offset(-56)):
        with Locations((-5.5, 10.5)):
            Circle(SKETCH_66_R)
    extrude(amount=-EXTRUDE_28_DEPTH)

    # 倒角2
    chamfer_2_edges = [part.edges().sort_by_distance(p)[0] for p in [
        (20.5, -4, -6.5),
        (46.75, -4, -13),
        (46.75, -4, 0),
        (31.617123072, -4, -11.5),
        (46.91669078, -4, -11.5),
        (73, -4, -6.5),
    ]]
    chamfer(chamfer_2_edges, length=CHAMFER_2_SIZE)

    # 圆角3
    fillet_3_edges = [part.edges().sort_by_distance(p)[0] for p in [
        (58, 47, -42),
        (58, 47, 0),
        (20.5, 2.25, -42),
        (65, 2.25, -42),
    ]]
    fillet(fillet_3_edges, radius=FILLET_3_R)

    # 草图67 → 凸台-拉伸29 (add)
    with BuildSketch(Plane(origin=(0, 0, -42), x_dir=(-1, 0, 0), z_dir=(0, 0, -1))):
        Polygon((-60, 6.5), (-60, 4.5), (-62, 4.5), align=None)
    extrude(amount=-EXTRUDE_29_DEPTH)

    # 圆角4
    # the kernel refuses this fillet: 2 mm, written as the material it takes off along each edge
    with BuildSketch(Plane(origin=(73, -5, -18), x_dir=(0, 0, 1), z_dir=(0, 1, 0))) as fillet_4_piece_1:
        with BuildLine():
            CenterArc((FILLET_4_R, -FILLET_4_R), FILLET_4_R, 90, 90)
            Line((0, -FILLET_4_R), (0, 0))
            Line((0, 0), (FILLET_4_R, 0))
        make_face()
    extrude(amount=19.5, mode=Mode.SUBTRACT)
    with BuildSketch(Plane(origin=(73, -8.6, 0), x_dir=(-1, 0, 0), z_dir=(0, 1, 0))) as fillet_4_piece_2:
        with BuildLine():
            CenterArc((FILLET_4_R, -FILLET_4_R), FILLET_4_R, 90, 90)
            Line((0, -FILLET_4_R), (0, 0))
            Line((0, 0), (FILLET_4_R, 0))
        make_face()
    extrude(amount=23.1, mode=Mode.SUBTRACT)
    with BuildSketch(Plane(origin=(20.5, 9.5, 0), x_dir=(1, 0, 0), z_dir=(0, -1, 0))) as fillet_4_piece_3:
        with BuildLine():
            CenterArc((FILLET_4_R, -FILLET_4_R), FILLET_4_R, 90, 90)
            Line((0, -FILLET_4_R), (0, 0))
            Line((0, 0), (FILLET_4_R, 0))
        make_face()
    extrude(amount=18.1, mode=Mode.SUBTRACT)

    # 草图68 → 切除-拉伸25 (cut)
    with BuildSketch(Plane(origin=(60, 0, 0), x_dir=(0, 0, -1), z_dir=(1, 0, 0)).offset(CUT_EXTRUDE_START_2)):
        Polygon((21, 40.43375673), (8.5, 33.216878365), (8.5, 18.783121635), (21, 11.56624327), (33.5, 18.783121635), (33.5, 33.216878365), align=None)
    extrude(amount=CUT_EXTRUDE_25_DEPTH, mode=Mode.SUBTRACT)

    # 草图69 → 凸台-拉伸30 (add)
    with BuildSketch(Plane(origin=(0, 9.5, 0), x_dir=(1, 0, 0), z_dir=(0, 1, 0))):
        with BuildLine():
            Line((73, 2), (73, 16))
            ThreePointArc((73, 16), (72.414213562, 17.414213562), (71, 18))
            Line((71, 18), (60, 18))
            Line((60, 18), (60, 0))
            Line((60, 0), (64, 0))
            Line((64, 0), (64, 12))
            Line((64, 12), (70, 12))
            Line((70, 12), (70, 0))
            Line((70, 0), (71, 0))
            ThreePointArc((71, 0), (72.414213562, 0.585786438), (73, 2))
        make_face()
    extrude(amount=EXTRUDE_30_DEPTH)


solid = part.part
